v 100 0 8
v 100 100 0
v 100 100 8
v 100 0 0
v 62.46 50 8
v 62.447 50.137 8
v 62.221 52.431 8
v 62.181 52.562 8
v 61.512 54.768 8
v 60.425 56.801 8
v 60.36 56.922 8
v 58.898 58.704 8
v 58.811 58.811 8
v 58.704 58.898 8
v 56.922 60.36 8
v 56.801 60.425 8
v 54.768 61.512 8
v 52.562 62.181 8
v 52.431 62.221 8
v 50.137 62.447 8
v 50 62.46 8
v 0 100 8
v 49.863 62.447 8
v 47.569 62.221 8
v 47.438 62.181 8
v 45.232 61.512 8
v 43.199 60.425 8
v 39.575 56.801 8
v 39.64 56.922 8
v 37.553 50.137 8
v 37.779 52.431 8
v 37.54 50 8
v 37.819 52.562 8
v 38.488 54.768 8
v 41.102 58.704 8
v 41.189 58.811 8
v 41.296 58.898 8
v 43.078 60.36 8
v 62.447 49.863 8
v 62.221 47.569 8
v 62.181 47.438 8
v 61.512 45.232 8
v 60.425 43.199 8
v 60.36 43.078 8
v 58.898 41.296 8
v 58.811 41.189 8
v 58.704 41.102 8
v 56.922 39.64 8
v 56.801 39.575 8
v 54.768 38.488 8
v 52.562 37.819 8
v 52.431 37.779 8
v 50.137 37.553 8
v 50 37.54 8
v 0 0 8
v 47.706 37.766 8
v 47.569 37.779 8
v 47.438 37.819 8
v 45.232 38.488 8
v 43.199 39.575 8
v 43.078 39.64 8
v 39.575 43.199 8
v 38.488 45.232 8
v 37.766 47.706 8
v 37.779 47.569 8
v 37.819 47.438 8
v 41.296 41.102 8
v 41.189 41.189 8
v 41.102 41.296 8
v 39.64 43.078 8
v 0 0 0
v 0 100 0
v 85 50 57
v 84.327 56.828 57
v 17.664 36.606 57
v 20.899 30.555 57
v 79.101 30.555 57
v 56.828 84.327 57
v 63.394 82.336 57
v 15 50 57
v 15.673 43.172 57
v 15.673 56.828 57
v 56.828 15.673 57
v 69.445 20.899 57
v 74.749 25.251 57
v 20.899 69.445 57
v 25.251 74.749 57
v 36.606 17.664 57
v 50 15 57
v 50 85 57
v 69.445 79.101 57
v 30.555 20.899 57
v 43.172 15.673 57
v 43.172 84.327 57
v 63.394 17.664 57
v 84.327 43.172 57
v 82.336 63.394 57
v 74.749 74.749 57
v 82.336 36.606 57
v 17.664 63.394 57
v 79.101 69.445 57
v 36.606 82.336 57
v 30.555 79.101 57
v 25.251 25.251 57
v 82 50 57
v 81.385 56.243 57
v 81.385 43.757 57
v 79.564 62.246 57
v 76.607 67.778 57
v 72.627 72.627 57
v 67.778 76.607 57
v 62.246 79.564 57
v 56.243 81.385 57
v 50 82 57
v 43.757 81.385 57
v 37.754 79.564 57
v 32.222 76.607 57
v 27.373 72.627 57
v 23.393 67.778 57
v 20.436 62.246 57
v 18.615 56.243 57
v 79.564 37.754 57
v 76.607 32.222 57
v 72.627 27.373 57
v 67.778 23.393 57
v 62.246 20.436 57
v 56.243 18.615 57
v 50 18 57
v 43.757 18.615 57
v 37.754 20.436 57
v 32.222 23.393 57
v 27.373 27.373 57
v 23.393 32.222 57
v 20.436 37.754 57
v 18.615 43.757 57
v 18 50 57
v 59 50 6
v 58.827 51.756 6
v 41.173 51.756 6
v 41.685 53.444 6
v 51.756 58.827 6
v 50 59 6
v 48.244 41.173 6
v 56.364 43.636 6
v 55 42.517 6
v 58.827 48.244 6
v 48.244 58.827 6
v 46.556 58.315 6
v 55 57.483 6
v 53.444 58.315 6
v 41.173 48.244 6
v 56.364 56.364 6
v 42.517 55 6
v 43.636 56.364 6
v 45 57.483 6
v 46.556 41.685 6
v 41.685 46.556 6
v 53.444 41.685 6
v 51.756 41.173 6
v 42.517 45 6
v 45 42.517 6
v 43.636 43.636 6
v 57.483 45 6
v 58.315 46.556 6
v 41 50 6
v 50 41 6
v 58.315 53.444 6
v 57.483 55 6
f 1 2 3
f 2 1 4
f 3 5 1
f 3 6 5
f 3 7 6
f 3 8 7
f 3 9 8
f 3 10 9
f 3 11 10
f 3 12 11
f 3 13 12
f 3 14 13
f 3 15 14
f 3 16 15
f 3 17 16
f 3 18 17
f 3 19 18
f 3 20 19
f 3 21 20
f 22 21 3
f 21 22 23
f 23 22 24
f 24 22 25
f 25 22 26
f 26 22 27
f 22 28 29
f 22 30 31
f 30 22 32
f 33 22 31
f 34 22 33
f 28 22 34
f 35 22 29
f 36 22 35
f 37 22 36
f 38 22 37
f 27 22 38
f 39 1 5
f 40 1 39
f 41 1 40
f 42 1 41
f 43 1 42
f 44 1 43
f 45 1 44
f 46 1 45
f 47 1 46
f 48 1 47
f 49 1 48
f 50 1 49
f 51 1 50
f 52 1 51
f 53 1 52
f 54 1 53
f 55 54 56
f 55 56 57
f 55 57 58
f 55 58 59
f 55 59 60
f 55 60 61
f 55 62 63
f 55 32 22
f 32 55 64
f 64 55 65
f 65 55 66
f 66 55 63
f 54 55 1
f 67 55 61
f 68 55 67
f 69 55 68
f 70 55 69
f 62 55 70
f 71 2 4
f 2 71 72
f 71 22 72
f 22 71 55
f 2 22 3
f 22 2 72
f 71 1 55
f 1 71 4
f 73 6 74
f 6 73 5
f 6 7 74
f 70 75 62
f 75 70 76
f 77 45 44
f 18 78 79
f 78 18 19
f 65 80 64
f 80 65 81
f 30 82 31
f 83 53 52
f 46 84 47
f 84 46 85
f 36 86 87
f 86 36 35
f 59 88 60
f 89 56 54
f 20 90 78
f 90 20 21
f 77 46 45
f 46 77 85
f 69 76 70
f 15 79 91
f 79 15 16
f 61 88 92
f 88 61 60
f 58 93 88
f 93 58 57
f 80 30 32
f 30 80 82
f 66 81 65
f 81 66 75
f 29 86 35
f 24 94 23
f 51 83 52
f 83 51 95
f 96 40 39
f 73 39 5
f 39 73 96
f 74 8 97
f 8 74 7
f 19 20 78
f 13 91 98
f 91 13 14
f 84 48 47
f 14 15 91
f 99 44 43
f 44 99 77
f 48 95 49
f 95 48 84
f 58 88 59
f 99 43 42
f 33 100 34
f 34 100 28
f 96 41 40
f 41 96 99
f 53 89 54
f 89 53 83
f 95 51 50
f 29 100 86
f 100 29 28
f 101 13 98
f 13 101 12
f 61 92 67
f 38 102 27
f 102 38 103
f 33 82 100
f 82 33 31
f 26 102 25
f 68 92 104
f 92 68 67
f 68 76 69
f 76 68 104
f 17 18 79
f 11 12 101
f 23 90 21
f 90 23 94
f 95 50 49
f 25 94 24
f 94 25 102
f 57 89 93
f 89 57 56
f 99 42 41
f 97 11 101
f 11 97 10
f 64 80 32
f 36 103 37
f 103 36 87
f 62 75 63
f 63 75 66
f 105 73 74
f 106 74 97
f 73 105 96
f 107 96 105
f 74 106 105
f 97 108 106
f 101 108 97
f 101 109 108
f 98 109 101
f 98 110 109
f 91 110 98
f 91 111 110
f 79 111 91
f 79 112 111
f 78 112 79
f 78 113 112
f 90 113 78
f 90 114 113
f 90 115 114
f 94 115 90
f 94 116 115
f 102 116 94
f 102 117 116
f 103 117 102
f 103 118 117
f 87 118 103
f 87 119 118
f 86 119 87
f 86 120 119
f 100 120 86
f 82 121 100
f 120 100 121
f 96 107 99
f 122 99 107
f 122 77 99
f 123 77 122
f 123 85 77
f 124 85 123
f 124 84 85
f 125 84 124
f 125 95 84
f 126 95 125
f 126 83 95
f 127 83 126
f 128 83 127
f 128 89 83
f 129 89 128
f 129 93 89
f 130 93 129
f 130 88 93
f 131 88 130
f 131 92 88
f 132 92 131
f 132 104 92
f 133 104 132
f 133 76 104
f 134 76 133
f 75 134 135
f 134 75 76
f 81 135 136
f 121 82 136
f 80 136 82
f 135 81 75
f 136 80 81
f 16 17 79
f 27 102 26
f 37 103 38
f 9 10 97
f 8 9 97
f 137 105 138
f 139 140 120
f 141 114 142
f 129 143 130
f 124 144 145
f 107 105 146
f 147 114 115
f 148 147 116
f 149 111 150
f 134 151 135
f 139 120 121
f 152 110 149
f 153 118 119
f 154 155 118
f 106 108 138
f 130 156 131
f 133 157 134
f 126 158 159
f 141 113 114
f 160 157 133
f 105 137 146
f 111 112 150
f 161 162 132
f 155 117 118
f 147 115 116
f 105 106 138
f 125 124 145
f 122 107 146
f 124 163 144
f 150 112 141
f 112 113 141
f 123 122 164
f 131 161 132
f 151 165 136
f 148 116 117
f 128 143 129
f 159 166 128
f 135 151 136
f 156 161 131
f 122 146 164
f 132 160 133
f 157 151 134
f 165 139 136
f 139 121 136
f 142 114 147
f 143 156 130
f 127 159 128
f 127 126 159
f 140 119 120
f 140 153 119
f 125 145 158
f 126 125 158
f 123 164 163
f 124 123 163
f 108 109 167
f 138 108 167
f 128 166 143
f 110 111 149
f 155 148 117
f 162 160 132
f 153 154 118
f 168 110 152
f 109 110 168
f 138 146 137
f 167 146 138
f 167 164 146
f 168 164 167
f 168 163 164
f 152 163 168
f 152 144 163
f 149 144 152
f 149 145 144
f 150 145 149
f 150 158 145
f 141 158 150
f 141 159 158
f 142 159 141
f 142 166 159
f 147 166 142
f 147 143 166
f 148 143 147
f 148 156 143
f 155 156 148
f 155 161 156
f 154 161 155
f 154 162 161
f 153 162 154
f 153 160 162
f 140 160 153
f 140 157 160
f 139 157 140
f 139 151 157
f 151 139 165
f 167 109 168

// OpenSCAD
$fn = 32;

// ----------------------------------------------------------------------
// Hopper: funnel with square flange
// ----------------------------------------------------------------------

// --- parameters (mm) ---
fl = 100;                 // flange side, X and Y
fl_t = 8;                 // flange thickness
cone_h = 50;              // cone height above the flange
top_d = 70;               // cone mouth diameter
bot_d = 24;               // cone spout diameter
wall = 3;                 // cone wall thickness
fit_tol = 0.1;            // tolerance for press fits, mm
free_tol = 0.5;           // tolerance for clearance fits, mm

bore_d = bot_d - 2 * wall;  // spout bore diameter
total_h = fl_t + cone_h - 1;  // overall height

difference() {
  union() {
    cube([fl, fl, fl_t]);
    translate([fl / 2, fl / 2, fl_t - 1])
      cylinder(h = cone_h, d1 = bot_d, d2 = top_d);
  }
  translate([fl / 2, fl / 2, fl_t - 2])
    cylinder(h = cone_h + 1, d1 = bore_d, d2 = top_d - 2 * wall);
}
